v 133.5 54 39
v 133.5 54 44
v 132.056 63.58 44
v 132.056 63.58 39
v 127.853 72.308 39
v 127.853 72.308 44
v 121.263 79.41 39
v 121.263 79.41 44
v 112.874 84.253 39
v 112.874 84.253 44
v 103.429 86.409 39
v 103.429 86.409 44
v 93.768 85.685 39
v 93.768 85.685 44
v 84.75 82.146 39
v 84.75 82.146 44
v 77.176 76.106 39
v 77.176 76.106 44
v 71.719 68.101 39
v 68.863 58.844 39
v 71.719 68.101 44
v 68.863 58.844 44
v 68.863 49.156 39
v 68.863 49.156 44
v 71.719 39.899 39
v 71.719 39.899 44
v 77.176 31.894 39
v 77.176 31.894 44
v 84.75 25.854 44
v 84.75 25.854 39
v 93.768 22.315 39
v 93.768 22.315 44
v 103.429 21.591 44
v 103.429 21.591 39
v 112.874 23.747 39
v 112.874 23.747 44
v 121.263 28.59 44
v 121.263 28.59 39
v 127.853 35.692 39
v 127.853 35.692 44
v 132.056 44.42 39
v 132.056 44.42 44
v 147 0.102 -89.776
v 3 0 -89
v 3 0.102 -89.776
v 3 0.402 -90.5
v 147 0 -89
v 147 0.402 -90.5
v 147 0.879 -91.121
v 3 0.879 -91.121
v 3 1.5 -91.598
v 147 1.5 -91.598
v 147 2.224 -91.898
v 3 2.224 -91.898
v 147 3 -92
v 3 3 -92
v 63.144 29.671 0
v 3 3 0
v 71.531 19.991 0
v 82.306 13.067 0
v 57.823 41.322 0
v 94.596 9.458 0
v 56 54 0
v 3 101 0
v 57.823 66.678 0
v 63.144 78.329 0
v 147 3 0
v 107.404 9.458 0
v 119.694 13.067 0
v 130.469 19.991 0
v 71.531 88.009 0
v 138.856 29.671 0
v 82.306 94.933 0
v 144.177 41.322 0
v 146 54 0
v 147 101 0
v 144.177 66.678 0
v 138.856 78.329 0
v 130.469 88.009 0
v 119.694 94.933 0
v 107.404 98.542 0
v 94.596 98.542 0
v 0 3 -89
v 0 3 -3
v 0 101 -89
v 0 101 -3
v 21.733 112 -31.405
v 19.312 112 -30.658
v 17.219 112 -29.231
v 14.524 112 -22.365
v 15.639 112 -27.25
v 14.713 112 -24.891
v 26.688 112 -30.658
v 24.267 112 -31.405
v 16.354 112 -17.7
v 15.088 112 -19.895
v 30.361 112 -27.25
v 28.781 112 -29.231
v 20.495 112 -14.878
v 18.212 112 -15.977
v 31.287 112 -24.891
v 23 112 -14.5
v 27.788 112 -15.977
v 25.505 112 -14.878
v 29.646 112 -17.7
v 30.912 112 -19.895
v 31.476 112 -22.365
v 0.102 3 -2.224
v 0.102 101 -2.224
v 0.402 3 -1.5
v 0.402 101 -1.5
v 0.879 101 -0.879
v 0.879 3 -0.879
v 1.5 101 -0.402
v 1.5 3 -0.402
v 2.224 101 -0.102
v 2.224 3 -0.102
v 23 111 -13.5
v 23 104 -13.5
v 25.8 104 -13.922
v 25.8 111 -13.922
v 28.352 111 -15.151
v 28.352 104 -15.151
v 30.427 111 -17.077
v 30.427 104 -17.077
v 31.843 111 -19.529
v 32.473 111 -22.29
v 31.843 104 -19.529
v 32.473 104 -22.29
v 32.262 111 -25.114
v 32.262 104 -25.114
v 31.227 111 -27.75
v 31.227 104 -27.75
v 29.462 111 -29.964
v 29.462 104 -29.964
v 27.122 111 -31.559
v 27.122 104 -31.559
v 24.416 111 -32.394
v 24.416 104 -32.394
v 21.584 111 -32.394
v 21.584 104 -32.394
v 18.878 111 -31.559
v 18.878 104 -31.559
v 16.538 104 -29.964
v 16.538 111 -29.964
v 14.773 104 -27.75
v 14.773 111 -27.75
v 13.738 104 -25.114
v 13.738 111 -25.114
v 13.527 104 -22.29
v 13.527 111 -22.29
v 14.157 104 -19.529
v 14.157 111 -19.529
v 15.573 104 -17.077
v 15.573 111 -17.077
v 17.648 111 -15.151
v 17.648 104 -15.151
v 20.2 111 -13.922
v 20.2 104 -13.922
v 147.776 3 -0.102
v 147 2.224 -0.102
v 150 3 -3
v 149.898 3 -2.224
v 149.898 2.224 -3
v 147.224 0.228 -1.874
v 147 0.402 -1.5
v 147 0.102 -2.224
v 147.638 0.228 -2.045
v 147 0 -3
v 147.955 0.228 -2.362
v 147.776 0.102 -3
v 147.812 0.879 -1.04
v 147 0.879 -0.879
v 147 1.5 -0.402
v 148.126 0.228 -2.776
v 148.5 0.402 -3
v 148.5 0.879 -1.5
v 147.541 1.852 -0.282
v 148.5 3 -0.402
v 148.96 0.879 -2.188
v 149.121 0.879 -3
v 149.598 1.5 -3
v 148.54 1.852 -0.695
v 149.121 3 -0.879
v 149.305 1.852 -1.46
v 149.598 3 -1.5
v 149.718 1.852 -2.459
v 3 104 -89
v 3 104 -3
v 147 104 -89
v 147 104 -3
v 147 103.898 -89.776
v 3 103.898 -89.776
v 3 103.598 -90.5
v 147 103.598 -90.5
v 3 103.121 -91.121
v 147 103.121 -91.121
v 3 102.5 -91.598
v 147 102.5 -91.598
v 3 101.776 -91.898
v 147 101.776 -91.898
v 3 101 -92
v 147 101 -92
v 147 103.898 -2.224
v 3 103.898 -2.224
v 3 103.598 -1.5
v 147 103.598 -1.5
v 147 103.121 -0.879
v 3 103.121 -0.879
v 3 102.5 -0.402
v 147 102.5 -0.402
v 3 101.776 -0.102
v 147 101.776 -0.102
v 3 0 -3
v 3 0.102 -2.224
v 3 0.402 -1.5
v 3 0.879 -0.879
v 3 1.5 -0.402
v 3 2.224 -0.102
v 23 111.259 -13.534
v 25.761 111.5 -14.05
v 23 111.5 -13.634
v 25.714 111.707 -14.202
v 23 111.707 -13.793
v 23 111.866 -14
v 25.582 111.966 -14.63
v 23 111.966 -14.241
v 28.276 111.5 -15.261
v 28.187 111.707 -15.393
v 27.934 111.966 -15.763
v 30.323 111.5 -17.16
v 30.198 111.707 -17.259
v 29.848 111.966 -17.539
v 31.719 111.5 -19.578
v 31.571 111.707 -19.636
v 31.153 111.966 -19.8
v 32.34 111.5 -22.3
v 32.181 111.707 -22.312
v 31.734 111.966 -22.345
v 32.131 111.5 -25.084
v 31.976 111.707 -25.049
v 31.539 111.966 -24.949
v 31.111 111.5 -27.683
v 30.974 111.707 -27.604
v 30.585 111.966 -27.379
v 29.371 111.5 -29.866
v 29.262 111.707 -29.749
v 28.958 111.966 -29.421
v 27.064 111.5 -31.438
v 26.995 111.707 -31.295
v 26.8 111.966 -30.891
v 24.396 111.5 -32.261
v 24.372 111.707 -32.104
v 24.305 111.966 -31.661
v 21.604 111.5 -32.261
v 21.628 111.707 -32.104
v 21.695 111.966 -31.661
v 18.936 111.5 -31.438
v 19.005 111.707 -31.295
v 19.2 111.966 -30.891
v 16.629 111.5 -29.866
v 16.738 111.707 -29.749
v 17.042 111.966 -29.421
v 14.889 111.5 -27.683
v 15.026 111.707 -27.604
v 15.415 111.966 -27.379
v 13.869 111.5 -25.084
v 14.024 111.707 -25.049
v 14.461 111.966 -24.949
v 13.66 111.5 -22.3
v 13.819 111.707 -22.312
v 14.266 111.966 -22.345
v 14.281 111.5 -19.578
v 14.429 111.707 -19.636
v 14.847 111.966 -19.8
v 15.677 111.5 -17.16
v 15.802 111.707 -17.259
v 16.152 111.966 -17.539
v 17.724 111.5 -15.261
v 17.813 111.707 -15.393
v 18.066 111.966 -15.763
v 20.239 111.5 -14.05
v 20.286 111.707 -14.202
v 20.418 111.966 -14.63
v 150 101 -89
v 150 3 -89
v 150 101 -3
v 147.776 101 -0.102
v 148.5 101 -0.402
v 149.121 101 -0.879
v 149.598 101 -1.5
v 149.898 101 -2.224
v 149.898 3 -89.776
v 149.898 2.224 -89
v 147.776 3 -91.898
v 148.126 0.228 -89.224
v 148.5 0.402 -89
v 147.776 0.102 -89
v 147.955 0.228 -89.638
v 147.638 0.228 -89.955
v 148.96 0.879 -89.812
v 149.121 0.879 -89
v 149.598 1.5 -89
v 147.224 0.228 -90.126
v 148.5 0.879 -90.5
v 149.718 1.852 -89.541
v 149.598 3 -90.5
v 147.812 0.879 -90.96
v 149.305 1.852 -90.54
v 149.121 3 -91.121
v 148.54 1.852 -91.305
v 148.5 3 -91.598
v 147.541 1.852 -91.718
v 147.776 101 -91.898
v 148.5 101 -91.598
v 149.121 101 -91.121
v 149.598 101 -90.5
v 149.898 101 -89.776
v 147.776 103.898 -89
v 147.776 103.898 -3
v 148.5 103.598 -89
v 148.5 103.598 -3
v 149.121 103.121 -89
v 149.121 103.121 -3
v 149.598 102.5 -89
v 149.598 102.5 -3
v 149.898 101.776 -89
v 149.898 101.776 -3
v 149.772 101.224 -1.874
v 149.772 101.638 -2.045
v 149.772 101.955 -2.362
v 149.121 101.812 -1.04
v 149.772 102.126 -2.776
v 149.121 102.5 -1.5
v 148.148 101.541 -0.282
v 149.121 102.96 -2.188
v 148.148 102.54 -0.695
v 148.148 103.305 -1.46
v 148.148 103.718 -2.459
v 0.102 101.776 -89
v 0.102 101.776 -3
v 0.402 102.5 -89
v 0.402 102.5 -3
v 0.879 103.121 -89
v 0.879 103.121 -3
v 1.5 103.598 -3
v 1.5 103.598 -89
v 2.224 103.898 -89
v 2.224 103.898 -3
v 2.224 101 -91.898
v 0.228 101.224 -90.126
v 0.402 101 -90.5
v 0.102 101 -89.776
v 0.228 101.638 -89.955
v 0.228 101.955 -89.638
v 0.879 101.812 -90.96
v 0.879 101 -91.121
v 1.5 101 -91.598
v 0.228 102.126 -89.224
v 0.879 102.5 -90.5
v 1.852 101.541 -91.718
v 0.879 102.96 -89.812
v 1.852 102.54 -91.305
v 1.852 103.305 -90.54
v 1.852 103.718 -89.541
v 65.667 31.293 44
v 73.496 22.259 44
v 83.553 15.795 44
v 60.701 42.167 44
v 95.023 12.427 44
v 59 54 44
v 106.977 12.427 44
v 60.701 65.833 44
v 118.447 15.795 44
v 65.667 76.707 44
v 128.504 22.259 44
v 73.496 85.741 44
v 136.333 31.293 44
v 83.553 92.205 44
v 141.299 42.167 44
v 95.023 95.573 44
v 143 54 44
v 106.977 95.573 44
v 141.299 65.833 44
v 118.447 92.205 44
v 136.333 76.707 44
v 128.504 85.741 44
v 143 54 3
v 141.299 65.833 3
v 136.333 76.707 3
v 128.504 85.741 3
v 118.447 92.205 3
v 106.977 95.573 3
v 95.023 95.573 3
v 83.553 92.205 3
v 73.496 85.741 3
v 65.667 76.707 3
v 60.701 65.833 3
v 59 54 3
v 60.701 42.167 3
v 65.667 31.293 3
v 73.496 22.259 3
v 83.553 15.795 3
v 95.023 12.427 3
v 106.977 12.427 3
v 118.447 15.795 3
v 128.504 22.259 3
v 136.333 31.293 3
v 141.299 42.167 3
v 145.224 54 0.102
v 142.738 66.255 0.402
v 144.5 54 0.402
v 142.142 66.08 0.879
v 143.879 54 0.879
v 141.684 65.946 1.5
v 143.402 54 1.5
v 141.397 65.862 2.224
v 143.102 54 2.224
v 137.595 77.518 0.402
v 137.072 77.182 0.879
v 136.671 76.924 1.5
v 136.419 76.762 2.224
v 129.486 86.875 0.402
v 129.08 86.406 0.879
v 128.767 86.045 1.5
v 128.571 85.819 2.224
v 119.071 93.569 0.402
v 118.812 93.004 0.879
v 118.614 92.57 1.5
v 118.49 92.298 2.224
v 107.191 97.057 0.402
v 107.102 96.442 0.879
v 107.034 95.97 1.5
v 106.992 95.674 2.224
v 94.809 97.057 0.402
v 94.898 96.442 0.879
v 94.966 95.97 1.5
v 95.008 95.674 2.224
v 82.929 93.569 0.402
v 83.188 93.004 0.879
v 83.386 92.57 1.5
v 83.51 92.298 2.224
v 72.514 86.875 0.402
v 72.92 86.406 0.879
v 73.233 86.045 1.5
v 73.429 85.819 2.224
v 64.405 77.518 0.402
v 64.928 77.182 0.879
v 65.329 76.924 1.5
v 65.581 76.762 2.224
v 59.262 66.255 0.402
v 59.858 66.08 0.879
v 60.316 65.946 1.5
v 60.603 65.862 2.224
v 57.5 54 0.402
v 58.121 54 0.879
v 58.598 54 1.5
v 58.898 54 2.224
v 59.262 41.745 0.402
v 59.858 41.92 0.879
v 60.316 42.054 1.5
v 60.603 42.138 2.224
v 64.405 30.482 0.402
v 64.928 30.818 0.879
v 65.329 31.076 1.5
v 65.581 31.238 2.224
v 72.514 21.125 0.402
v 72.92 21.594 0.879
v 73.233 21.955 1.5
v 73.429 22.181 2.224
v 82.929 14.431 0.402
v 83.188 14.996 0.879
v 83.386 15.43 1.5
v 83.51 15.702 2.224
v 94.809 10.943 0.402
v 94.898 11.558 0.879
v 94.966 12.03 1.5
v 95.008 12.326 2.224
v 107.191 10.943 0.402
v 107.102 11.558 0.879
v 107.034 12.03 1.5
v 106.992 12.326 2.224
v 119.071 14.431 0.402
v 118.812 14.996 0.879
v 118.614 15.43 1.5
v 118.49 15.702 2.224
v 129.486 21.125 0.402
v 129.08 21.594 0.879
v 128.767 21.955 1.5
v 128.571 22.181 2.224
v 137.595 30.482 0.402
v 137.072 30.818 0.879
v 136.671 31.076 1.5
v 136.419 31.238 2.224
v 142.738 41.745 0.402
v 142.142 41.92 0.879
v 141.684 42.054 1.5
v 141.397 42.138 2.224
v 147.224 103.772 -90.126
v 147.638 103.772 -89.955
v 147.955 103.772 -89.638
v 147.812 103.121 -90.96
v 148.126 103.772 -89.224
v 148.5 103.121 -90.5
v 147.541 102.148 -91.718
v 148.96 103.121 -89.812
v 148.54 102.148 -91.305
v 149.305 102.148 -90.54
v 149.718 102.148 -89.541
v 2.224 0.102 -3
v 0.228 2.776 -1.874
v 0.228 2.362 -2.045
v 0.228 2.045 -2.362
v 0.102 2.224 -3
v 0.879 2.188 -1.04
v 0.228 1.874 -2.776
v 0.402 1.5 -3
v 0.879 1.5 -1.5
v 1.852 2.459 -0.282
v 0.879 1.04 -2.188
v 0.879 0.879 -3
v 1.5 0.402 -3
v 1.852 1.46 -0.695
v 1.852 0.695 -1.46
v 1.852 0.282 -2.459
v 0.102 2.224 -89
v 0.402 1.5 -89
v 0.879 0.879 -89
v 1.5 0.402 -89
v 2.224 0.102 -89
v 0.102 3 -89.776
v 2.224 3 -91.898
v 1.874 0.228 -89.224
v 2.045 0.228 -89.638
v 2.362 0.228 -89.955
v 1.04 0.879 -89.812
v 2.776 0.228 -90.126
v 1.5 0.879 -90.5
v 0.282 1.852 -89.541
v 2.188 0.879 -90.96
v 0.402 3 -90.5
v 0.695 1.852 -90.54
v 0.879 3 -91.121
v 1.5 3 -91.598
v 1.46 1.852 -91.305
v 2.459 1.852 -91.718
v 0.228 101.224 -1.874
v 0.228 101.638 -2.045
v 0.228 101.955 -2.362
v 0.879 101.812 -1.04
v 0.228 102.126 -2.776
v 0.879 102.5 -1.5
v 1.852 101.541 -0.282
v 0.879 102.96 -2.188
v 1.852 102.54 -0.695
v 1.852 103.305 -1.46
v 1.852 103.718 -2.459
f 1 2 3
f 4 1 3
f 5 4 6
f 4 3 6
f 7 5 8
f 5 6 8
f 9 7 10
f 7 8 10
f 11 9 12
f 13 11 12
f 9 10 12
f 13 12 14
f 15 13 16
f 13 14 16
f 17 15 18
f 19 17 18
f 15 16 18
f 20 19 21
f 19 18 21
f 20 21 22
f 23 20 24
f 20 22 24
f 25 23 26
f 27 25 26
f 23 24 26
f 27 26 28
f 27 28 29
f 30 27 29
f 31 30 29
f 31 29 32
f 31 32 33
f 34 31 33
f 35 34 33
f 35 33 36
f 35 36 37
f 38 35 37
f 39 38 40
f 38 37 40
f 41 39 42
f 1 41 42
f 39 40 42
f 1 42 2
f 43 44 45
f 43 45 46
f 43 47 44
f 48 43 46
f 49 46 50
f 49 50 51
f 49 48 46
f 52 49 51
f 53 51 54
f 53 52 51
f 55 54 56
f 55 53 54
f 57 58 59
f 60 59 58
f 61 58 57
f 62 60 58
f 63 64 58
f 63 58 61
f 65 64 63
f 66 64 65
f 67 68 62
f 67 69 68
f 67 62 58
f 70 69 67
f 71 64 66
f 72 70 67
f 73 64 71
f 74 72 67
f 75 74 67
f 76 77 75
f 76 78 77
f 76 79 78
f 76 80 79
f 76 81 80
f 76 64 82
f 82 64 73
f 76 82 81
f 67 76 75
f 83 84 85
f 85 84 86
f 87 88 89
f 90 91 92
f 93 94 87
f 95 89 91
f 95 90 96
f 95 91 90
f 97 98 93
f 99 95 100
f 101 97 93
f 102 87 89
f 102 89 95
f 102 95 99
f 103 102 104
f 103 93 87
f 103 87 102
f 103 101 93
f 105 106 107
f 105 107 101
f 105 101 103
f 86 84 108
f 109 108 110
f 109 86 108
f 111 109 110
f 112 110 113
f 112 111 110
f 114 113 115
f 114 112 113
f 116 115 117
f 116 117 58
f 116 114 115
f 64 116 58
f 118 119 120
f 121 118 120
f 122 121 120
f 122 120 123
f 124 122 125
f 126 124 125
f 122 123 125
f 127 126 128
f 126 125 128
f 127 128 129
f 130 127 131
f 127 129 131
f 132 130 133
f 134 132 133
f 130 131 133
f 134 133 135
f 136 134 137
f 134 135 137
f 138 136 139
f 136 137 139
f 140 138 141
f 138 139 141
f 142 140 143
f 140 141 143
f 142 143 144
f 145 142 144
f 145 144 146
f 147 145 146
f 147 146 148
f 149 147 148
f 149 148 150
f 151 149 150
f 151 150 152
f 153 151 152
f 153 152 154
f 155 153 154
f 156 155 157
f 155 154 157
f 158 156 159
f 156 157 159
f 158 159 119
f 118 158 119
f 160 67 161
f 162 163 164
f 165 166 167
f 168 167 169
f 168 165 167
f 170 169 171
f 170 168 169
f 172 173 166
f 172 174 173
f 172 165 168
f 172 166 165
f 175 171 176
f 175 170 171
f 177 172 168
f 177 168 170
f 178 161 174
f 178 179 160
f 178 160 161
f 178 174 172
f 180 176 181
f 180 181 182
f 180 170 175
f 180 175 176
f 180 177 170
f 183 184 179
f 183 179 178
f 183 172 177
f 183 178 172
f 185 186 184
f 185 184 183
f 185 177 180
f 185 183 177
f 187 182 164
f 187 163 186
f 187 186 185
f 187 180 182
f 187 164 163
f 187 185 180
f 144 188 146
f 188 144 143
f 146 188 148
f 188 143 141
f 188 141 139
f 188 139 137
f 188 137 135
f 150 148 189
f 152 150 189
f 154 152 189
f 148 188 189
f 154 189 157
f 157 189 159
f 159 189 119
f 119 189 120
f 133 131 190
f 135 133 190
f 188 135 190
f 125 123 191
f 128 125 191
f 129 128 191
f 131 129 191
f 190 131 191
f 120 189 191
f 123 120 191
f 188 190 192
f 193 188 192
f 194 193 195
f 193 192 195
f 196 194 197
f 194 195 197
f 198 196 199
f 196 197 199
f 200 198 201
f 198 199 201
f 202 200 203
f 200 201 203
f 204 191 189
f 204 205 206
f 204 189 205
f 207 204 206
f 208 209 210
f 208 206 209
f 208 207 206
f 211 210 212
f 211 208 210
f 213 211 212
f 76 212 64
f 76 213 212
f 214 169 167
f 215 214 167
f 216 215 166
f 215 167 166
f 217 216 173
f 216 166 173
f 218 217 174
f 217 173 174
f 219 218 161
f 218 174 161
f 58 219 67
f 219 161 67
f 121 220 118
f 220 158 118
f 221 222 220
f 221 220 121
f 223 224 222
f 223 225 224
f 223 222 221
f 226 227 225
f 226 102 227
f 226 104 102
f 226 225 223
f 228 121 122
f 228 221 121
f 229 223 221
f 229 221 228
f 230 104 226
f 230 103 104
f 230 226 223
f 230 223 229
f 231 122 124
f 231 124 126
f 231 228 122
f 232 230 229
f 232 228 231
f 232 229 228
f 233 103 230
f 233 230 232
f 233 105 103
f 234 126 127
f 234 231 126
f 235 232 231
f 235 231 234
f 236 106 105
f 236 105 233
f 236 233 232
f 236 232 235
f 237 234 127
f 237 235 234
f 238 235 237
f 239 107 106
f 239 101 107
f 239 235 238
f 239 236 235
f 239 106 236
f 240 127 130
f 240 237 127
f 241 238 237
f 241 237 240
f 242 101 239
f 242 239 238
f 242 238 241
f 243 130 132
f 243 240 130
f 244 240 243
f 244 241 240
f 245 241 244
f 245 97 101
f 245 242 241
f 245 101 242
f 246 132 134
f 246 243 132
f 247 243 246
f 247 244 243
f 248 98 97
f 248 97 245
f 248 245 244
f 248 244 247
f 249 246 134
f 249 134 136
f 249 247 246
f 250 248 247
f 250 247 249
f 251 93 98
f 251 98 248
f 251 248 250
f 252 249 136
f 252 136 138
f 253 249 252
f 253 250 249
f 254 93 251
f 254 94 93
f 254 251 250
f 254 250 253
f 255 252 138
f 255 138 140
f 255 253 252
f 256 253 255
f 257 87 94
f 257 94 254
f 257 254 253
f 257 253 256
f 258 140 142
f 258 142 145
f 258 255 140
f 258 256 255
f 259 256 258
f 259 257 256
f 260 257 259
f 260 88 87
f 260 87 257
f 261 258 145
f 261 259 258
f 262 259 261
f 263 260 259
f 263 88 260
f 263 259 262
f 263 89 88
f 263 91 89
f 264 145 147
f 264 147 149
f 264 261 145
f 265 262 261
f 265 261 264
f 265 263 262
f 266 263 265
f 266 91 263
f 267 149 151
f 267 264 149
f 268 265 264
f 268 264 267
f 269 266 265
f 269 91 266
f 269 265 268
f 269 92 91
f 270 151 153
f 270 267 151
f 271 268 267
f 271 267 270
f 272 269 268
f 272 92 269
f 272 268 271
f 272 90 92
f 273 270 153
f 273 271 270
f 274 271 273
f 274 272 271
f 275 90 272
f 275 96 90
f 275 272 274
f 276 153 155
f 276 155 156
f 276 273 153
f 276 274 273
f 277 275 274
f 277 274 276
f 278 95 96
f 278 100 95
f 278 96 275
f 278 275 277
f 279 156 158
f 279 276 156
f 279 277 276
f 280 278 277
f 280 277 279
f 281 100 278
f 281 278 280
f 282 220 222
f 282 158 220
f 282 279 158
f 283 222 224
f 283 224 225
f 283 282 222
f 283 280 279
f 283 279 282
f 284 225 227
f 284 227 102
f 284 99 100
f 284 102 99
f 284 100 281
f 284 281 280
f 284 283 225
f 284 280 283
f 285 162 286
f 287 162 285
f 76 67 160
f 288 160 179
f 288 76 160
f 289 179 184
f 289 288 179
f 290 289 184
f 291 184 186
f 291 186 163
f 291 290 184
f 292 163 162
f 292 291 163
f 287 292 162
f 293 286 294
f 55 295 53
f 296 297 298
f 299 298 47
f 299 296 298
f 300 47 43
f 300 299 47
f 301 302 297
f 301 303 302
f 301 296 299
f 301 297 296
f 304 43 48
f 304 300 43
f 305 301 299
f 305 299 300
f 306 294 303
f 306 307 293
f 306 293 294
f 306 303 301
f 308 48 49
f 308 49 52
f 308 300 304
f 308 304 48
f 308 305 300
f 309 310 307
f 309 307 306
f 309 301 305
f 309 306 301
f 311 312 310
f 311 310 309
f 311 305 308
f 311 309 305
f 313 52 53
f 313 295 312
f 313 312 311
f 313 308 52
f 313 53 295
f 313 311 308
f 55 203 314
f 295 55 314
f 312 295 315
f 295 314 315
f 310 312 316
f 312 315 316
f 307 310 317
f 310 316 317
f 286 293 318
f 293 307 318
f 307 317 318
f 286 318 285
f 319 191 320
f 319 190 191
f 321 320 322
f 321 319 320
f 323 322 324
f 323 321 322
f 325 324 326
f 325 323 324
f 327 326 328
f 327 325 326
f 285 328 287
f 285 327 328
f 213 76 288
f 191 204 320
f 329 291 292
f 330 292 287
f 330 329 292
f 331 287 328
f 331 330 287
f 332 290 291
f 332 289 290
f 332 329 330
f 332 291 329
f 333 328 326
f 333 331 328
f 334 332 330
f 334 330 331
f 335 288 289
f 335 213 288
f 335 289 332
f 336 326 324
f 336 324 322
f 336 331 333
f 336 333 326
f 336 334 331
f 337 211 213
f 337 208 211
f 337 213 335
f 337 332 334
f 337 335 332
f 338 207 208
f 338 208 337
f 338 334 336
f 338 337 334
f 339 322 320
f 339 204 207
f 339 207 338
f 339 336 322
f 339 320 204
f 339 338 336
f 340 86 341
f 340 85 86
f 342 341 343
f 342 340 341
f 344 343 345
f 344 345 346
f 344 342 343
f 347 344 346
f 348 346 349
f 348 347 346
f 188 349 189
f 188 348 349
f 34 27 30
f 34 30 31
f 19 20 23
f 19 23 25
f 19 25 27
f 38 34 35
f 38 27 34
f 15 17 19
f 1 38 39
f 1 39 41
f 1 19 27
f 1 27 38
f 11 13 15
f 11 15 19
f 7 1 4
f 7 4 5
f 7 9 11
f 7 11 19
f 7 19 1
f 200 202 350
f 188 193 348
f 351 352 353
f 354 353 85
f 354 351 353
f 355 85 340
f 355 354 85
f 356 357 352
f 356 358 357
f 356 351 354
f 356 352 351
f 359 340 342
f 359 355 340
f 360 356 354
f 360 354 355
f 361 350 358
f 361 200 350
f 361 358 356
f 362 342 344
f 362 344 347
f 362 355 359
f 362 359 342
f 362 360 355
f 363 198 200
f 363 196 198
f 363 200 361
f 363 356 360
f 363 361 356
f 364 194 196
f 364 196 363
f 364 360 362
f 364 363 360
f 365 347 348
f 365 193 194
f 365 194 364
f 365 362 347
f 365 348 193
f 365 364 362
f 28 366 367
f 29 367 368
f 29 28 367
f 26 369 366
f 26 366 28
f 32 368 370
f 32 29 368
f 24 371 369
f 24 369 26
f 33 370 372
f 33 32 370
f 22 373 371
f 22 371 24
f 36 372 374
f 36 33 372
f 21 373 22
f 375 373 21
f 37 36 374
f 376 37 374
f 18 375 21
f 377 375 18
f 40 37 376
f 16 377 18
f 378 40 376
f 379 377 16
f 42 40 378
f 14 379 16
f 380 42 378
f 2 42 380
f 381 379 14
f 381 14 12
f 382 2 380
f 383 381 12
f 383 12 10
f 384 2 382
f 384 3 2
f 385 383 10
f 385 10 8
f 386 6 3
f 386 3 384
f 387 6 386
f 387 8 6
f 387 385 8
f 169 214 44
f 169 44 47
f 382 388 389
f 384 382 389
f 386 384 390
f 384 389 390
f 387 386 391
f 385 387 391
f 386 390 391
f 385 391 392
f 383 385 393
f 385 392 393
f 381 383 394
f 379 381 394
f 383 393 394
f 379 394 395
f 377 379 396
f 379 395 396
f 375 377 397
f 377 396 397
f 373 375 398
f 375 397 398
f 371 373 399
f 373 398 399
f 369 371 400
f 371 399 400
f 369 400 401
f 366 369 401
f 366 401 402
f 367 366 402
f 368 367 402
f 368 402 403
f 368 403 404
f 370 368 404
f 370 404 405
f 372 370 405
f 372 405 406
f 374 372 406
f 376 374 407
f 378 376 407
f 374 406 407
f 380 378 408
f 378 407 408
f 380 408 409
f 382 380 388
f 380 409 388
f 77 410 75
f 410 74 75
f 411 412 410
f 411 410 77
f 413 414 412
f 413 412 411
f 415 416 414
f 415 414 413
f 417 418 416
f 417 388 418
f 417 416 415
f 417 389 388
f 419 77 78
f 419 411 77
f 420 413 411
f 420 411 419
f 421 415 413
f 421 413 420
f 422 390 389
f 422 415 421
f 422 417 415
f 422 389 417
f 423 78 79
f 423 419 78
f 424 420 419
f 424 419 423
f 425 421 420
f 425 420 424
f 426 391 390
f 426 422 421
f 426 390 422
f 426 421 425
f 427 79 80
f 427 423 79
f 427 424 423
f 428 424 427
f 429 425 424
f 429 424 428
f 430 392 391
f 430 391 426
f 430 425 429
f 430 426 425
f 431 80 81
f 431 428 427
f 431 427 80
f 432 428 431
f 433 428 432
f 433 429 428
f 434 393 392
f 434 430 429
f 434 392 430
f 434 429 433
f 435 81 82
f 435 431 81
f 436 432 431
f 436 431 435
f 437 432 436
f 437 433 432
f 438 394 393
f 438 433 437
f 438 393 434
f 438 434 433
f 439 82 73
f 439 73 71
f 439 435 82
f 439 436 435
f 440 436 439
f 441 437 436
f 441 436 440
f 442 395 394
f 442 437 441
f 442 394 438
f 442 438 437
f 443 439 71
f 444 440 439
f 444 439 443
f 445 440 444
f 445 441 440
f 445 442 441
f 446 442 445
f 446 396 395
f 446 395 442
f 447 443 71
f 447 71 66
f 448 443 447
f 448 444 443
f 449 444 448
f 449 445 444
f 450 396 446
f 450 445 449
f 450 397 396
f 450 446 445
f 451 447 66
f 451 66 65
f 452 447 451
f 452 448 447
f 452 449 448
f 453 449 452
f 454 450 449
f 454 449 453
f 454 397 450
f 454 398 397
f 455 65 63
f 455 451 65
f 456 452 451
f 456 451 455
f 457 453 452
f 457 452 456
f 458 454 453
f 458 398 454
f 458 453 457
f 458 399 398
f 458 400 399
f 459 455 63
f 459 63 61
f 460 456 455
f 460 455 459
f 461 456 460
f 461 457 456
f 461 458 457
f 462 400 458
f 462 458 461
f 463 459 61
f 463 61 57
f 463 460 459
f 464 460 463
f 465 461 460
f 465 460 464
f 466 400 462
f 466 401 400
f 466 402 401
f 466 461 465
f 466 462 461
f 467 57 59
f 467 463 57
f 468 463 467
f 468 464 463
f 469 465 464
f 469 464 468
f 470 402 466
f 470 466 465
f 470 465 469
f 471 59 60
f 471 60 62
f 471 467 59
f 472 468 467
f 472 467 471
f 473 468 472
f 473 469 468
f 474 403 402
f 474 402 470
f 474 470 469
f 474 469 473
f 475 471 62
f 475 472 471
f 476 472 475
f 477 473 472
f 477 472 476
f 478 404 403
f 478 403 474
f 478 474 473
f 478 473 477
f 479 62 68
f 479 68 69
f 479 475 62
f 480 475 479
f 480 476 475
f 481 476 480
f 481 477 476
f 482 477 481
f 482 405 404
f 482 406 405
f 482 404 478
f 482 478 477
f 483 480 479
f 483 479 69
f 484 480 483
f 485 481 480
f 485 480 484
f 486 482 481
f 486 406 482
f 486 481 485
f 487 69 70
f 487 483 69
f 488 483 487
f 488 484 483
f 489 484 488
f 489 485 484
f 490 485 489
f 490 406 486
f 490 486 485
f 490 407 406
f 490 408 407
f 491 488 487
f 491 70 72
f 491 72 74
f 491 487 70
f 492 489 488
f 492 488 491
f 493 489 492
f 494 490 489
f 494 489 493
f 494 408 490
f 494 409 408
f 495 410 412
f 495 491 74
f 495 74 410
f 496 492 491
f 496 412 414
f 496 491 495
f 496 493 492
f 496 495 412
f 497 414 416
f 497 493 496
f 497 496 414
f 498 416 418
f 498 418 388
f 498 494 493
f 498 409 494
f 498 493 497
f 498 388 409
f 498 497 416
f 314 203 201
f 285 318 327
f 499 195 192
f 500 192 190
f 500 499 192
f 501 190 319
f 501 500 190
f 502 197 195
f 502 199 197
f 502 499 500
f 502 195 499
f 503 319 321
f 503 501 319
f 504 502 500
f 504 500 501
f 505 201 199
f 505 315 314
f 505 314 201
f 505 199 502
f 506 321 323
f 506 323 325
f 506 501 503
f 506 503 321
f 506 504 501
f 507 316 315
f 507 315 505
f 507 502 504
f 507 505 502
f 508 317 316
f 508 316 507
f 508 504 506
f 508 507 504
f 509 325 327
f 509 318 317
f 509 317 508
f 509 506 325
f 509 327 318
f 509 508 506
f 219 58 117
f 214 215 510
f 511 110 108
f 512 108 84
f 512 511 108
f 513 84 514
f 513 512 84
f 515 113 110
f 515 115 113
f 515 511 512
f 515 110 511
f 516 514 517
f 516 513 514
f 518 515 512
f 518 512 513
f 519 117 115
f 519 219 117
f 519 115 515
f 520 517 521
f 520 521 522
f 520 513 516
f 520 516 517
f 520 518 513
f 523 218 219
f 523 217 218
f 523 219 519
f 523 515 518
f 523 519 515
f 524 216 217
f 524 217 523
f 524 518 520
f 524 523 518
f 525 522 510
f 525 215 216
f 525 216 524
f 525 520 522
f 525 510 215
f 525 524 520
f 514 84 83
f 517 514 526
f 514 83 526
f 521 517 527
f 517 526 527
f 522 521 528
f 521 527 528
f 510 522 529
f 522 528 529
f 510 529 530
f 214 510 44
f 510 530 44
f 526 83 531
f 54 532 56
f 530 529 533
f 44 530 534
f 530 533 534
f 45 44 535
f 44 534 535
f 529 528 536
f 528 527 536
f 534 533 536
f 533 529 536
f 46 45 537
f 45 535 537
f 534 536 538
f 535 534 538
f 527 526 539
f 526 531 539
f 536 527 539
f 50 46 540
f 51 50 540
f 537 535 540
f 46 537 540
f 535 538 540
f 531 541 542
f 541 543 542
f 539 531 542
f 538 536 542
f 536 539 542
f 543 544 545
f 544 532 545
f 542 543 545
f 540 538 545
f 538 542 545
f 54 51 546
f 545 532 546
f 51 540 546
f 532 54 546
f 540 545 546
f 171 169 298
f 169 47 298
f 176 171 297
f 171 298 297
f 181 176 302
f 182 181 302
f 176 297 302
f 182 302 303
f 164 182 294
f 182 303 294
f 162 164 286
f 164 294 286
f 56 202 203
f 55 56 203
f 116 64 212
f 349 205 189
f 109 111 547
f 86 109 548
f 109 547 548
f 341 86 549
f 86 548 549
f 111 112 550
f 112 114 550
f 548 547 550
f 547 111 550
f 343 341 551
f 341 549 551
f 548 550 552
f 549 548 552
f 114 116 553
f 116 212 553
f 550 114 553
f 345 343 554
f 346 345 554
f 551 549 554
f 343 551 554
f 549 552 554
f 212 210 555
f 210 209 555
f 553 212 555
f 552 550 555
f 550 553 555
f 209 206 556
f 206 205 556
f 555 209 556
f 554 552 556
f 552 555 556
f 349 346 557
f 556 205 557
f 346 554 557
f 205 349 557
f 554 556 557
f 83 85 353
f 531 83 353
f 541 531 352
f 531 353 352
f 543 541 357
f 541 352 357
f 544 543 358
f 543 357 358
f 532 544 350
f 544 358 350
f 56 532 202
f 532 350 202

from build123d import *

# Parameters (mm, degrees)
SKETCH1_W           = 150
SKETCH1_H           = 104
BOSS_EXTRUDE1_DEPTH = 92
SKETCH2_R           = 42
BOSS_EXTRUDE2_DEPTH = 44
FILLET1_R           = 3
FILLET2_R           = 3
SKETCH5_R           = 9.5
BOSS_EXTRUDE3_DEPTH = 8
FILLET3_R           = 1
SKETCH6_R           = 32.5
CUT_EXTRUDE1_DEPTH  = 5


with BuildPart() as part:
    # Sketch1 → Boss-Extrude1 (new body)
    with BuildSketch(Plane.XY):
        with Locations((75, 52)):
            Rectangle(SKETCH1_W, SKETCH1_H)
    extrude(amount=-BOSS_EXTRUDE1_DEPTH)

    # Sketch2 → Boss-Extrude2 (add)
    with BuildSketch(Plane.XY):
        with Locations((101, 54)):
            Circle(SKETCH2_R)
    extrude(amount=BOSS_EXTRUDE2_DEPTH)

    # Fillet1
    fillet1_edges = [part.edges().sort_by_distance(p)[0] for p in [
        (150, 52, -92),
        (75, 104, -92),
        (0, 52, -92),
        (75, 104, 0),
        (150, 52, 0),
        (75, 0, 0),
        (0, 52, 0),
        (0, 104, -46),
        (150, 104, -46),
        (150, 0, -46),
        (0, 0, -46),
        (75, 0, -92),
    ]]
    fillet(fillet1_edges, radius=FILLET1_R)

    # Fillet2
    fillet2_edges = [part.edges().sort_by_distance(p)[0] for p in [
        (59, 54, 0),
    ]]
    fillet(fillet2_edges, radius=FILLET2_R)

    # Sketch5 → Boss-Extrude3 (add)
    with BuildSketch(Plane(origin=(0, 104, 0), x_dir=(1, 0, 0), z_dir=(0, 1, 0))):
        with Locations(Location((23, 23, 0), (0, 0, 270))):
            Circle(SKETCH5_R)
    extrude(amount=BOSS_EXTRUDE3_DEPTH)

    # Fillet3
    fillet3_edges = [part.edges().sort_by_distance(p)[0] for p in [
        (23, 112, -32.5),
    ]]
    fillet(fillet3_edges, radius=FILLET3_R)

    # Sketch6 → Cut-Extrude1 (cut)
    with BuildSketch(Plane.XY.offset(44)):
        with Locations((101, 54)):
            Circle(SKETCH6_R)
    extrude(amount=-CUT_EXTRUDE1_DEPTH, mode=Mode.SUBTRACT)


solid = part.part
